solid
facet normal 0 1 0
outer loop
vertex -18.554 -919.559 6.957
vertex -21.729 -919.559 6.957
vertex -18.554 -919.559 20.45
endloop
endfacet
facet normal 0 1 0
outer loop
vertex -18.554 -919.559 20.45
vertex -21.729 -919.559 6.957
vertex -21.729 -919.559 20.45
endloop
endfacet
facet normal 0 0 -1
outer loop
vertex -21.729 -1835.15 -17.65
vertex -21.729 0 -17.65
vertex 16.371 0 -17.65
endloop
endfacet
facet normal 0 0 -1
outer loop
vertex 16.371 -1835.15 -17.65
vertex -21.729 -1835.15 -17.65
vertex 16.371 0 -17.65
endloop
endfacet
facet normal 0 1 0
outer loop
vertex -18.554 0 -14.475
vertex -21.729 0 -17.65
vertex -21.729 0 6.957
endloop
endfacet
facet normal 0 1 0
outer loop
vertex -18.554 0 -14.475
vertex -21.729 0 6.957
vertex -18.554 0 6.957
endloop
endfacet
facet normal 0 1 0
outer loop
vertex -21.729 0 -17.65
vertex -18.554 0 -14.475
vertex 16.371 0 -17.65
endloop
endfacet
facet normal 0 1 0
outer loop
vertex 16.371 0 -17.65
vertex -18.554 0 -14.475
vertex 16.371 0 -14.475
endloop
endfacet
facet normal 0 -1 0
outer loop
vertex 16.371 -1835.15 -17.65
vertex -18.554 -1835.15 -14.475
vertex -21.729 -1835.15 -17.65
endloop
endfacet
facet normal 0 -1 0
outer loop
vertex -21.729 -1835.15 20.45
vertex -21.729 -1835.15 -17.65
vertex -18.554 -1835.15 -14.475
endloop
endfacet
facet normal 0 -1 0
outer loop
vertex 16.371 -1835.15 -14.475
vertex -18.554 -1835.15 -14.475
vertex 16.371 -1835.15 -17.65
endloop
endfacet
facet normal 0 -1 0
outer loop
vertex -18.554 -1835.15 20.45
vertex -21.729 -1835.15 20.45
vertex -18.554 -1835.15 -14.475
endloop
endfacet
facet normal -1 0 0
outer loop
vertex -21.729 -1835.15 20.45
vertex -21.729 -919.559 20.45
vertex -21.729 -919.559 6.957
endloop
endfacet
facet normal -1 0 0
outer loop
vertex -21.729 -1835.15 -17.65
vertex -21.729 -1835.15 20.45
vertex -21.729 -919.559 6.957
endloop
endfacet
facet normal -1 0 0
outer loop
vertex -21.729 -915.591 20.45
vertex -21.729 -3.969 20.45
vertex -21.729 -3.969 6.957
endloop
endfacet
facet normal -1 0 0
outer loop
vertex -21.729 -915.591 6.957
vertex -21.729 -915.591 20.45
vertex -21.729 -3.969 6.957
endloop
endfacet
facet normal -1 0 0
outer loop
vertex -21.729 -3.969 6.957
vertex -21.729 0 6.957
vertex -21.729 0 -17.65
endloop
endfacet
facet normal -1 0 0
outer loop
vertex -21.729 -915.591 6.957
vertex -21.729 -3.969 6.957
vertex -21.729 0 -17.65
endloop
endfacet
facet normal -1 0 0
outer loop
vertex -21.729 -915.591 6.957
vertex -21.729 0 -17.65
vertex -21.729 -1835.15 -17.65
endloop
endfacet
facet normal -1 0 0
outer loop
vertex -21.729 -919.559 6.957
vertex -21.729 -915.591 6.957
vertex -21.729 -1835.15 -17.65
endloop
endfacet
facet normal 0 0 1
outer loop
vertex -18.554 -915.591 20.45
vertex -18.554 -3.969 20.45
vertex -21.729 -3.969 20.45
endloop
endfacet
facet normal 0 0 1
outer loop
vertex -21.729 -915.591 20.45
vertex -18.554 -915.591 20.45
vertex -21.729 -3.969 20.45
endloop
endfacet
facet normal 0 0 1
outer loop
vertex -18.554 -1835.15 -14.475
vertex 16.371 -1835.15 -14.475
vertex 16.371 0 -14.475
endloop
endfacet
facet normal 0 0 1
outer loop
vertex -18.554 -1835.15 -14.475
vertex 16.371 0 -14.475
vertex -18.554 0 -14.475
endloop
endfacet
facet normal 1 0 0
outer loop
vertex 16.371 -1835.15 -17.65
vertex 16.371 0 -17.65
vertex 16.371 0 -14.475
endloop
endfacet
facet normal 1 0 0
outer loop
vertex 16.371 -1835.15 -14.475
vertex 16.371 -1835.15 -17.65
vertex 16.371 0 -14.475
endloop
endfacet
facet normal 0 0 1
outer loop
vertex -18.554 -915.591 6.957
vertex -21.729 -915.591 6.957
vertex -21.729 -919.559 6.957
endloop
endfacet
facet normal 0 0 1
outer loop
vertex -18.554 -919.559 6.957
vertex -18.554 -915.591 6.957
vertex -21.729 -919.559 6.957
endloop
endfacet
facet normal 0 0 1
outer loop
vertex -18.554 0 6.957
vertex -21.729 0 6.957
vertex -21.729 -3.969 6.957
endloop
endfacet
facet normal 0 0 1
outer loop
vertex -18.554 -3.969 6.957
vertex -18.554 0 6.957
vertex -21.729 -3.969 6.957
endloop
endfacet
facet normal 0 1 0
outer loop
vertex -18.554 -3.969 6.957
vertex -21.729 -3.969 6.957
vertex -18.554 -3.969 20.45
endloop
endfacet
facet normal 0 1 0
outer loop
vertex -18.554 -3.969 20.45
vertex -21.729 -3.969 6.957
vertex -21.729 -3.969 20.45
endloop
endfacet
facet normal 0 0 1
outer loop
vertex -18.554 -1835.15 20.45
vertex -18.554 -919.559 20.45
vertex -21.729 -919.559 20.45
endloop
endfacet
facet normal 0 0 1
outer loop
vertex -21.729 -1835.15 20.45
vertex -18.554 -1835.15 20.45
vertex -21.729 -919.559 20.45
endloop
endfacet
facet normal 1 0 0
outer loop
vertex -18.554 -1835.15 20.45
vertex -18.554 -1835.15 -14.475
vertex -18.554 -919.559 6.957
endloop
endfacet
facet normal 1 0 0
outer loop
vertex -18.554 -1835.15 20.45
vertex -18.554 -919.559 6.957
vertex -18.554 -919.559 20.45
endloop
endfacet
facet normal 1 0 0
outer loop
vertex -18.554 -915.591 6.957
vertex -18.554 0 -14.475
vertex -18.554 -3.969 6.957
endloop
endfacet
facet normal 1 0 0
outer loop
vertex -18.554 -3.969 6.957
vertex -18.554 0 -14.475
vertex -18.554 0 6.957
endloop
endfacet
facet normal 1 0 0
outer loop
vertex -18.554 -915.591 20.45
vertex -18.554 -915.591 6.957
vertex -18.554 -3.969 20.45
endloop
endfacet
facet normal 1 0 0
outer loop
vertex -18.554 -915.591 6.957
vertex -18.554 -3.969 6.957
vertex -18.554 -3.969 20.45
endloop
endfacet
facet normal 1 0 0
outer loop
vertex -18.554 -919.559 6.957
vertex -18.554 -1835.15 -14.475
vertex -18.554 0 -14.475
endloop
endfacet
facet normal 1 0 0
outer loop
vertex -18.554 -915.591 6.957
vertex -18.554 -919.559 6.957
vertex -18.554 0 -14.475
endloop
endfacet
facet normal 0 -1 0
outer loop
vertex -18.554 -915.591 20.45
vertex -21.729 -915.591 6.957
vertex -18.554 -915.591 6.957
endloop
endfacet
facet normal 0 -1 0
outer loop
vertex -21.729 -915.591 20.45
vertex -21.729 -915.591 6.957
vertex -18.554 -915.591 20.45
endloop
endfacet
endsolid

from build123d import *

# Parameters (mm, degrees)
F1_DEPTH = 1835.15
F2_W     = 3.96875
F2_H     = 13.49375
F3_DEPTH = 25.4


with BuildPart() as f1:
    # F0 (on Front) → F1 (new body)
    with BuildSketch(Plane.XZ):
        Polygon((-18.553972, 20.450408), (-21.728972, 20.450408), (-21.728972, -17.649592), (16.371028, -17.649592), (16.371028, -14.474592), (-18.553972, -14.474592), align=None)
    extrude(amount=F1_DEPTH)

    # F2 (on face) → F3 (cut)
    with BuildSketch(Plane(origin=(-21.728972, 0, 0), x_dir=(0, -1, 0), z_dir=(-1, 0, 0))):
        with Locations((917.575, 13.703533)):
            Rectangle(F2_W, F2_H)
        with Locations((1.984375, 13.703533)):
            Rectangle(F2_W, F2_H)
    extrude(amount=-F3_DEPTH, mode=Mode.SUBTRACT)


solid = f1.part
